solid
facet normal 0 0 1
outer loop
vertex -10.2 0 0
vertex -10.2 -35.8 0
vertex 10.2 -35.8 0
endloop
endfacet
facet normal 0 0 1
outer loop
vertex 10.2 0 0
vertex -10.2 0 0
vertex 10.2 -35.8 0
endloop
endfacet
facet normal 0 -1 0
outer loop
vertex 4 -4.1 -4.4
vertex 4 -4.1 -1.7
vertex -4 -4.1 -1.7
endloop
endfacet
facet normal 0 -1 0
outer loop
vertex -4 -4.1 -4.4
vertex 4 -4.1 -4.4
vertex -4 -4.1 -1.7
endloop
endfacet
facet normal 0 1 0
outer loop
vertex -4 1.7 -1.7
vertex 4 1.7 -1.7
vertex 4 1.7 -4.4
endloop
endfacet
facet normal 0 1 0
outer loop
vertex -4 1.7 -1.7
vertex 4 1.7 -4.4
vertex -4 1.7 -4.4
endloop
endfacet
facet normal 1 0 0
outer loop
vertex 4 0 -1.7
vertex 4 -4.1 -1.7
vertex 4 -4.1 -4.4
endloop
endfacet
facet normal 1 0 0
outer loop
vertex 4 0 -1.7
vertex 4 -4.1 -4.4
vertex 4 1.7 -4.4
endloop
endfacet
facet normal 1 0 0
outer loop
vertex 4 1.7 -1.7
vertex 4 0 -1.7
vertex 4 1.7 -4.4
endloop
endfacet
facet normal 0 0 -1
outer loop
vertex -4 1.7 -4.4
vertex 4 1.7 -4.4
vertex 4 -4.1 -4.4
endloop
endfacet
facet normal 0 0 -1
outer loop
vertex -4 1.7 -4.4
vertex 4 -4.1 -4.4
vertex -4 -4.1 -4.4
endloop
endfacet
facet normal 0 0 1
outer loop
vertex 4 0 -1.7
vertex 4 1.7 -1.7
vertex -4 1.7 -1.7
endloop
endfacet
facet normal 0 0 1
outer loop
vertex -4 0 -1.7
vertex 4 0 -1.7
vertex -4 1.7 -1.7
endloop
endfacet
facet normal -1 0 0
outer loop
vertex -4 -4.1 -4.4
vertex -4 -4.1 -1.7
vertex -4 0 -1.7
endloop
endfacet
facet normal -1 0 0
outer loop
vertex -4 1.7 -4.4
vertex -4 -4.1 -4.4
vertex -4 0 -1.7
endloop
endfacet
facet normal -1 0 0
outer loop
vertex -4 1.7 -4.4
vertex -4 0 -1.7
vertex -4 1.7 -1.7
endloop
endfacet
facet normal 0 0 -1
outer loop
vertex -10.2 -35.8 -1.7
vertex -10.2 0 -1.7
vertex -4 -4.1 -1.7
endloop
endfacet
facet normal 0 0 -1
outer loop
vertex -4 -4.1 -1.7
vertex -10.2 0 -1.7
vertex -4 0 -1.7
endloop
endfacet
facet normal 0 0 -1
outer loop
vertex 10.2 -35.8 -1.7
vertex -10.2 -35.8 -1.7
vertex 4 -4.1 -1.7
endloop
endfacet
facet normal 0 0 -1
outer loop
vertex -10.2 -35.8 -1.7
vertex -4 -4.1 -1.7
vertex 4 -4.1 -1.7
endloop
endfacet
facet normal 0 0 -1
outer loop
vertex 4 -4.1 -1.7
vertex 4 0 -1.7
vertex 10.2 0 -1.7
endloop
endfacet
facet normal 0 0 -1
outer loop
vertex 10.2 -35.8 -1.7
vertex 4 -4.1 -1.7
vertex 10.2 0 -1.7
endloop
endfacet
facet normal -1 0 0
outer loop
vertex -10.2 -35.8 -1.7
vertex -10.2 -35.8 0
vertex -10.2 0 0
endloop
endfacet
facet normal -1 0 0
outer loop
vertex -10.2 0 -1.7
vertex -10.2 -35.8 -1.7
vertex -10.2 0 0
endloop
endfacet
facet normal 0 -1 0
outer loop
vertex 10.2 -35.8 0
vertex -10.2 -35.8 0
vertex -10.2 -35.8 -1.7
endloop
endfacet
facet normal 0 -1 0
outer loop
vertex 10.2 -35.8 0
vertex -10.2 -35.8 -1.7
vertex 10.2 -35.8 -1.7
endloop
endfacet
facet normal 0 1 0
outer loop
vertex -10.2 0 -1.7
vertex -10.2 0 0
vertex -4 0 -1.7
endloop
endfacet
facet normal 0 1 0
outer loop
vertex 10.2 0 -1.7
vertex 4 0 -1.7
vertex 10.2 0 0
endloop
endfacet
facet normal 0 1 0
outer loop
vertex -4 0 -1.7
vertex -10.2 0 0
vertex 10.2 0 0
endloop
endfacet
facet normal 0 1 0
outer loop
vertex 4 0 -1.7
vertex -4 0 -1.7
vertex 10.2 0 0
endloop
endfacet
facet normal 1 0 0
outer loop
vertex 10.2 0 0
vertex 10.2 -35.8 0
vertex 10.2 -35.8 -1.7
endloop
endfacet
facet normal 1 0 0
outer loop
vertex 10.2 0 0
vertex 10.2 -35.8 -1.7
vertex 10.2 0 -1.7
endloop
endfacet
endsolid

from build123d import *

# Parameters (mm, degrees)
SKETCH1_W           = 20.4
SKETCH1_H           = 35.8
BOSS_EXTRUDE1_DEPTH = 1.7
SKETCH2_W           = 8
SKETCH2_H           = 5.8
BOSS_EXTRUDE2_DEPTH = 2.7


with BuildPart() as part:
    # Sketch1 → Boss-Extrude1 (new body)
    with BuildSketch(Plane.XY):
        with Locations((0, -17.9)):
            Rectangle(SKETCH1_W, SKETCH1_H)
    extrude(amount=-BOSS_EXTRUDE1_DEPTH)

    # Sketch2 → Boss-Extrude2 (add)
    with BuildSketch(Plane(origin=(0, 0, -1.7), x_dir=(-1, 0, 0), z_dir=(0, 0, -1))):
        with Locations((0, -1.2)):
            Rectangle(SKETCH2_W, SKETCH2_H)
    extrude(amount=BOSS_EXTRUDE2_DEPTH)


solid = part.part
